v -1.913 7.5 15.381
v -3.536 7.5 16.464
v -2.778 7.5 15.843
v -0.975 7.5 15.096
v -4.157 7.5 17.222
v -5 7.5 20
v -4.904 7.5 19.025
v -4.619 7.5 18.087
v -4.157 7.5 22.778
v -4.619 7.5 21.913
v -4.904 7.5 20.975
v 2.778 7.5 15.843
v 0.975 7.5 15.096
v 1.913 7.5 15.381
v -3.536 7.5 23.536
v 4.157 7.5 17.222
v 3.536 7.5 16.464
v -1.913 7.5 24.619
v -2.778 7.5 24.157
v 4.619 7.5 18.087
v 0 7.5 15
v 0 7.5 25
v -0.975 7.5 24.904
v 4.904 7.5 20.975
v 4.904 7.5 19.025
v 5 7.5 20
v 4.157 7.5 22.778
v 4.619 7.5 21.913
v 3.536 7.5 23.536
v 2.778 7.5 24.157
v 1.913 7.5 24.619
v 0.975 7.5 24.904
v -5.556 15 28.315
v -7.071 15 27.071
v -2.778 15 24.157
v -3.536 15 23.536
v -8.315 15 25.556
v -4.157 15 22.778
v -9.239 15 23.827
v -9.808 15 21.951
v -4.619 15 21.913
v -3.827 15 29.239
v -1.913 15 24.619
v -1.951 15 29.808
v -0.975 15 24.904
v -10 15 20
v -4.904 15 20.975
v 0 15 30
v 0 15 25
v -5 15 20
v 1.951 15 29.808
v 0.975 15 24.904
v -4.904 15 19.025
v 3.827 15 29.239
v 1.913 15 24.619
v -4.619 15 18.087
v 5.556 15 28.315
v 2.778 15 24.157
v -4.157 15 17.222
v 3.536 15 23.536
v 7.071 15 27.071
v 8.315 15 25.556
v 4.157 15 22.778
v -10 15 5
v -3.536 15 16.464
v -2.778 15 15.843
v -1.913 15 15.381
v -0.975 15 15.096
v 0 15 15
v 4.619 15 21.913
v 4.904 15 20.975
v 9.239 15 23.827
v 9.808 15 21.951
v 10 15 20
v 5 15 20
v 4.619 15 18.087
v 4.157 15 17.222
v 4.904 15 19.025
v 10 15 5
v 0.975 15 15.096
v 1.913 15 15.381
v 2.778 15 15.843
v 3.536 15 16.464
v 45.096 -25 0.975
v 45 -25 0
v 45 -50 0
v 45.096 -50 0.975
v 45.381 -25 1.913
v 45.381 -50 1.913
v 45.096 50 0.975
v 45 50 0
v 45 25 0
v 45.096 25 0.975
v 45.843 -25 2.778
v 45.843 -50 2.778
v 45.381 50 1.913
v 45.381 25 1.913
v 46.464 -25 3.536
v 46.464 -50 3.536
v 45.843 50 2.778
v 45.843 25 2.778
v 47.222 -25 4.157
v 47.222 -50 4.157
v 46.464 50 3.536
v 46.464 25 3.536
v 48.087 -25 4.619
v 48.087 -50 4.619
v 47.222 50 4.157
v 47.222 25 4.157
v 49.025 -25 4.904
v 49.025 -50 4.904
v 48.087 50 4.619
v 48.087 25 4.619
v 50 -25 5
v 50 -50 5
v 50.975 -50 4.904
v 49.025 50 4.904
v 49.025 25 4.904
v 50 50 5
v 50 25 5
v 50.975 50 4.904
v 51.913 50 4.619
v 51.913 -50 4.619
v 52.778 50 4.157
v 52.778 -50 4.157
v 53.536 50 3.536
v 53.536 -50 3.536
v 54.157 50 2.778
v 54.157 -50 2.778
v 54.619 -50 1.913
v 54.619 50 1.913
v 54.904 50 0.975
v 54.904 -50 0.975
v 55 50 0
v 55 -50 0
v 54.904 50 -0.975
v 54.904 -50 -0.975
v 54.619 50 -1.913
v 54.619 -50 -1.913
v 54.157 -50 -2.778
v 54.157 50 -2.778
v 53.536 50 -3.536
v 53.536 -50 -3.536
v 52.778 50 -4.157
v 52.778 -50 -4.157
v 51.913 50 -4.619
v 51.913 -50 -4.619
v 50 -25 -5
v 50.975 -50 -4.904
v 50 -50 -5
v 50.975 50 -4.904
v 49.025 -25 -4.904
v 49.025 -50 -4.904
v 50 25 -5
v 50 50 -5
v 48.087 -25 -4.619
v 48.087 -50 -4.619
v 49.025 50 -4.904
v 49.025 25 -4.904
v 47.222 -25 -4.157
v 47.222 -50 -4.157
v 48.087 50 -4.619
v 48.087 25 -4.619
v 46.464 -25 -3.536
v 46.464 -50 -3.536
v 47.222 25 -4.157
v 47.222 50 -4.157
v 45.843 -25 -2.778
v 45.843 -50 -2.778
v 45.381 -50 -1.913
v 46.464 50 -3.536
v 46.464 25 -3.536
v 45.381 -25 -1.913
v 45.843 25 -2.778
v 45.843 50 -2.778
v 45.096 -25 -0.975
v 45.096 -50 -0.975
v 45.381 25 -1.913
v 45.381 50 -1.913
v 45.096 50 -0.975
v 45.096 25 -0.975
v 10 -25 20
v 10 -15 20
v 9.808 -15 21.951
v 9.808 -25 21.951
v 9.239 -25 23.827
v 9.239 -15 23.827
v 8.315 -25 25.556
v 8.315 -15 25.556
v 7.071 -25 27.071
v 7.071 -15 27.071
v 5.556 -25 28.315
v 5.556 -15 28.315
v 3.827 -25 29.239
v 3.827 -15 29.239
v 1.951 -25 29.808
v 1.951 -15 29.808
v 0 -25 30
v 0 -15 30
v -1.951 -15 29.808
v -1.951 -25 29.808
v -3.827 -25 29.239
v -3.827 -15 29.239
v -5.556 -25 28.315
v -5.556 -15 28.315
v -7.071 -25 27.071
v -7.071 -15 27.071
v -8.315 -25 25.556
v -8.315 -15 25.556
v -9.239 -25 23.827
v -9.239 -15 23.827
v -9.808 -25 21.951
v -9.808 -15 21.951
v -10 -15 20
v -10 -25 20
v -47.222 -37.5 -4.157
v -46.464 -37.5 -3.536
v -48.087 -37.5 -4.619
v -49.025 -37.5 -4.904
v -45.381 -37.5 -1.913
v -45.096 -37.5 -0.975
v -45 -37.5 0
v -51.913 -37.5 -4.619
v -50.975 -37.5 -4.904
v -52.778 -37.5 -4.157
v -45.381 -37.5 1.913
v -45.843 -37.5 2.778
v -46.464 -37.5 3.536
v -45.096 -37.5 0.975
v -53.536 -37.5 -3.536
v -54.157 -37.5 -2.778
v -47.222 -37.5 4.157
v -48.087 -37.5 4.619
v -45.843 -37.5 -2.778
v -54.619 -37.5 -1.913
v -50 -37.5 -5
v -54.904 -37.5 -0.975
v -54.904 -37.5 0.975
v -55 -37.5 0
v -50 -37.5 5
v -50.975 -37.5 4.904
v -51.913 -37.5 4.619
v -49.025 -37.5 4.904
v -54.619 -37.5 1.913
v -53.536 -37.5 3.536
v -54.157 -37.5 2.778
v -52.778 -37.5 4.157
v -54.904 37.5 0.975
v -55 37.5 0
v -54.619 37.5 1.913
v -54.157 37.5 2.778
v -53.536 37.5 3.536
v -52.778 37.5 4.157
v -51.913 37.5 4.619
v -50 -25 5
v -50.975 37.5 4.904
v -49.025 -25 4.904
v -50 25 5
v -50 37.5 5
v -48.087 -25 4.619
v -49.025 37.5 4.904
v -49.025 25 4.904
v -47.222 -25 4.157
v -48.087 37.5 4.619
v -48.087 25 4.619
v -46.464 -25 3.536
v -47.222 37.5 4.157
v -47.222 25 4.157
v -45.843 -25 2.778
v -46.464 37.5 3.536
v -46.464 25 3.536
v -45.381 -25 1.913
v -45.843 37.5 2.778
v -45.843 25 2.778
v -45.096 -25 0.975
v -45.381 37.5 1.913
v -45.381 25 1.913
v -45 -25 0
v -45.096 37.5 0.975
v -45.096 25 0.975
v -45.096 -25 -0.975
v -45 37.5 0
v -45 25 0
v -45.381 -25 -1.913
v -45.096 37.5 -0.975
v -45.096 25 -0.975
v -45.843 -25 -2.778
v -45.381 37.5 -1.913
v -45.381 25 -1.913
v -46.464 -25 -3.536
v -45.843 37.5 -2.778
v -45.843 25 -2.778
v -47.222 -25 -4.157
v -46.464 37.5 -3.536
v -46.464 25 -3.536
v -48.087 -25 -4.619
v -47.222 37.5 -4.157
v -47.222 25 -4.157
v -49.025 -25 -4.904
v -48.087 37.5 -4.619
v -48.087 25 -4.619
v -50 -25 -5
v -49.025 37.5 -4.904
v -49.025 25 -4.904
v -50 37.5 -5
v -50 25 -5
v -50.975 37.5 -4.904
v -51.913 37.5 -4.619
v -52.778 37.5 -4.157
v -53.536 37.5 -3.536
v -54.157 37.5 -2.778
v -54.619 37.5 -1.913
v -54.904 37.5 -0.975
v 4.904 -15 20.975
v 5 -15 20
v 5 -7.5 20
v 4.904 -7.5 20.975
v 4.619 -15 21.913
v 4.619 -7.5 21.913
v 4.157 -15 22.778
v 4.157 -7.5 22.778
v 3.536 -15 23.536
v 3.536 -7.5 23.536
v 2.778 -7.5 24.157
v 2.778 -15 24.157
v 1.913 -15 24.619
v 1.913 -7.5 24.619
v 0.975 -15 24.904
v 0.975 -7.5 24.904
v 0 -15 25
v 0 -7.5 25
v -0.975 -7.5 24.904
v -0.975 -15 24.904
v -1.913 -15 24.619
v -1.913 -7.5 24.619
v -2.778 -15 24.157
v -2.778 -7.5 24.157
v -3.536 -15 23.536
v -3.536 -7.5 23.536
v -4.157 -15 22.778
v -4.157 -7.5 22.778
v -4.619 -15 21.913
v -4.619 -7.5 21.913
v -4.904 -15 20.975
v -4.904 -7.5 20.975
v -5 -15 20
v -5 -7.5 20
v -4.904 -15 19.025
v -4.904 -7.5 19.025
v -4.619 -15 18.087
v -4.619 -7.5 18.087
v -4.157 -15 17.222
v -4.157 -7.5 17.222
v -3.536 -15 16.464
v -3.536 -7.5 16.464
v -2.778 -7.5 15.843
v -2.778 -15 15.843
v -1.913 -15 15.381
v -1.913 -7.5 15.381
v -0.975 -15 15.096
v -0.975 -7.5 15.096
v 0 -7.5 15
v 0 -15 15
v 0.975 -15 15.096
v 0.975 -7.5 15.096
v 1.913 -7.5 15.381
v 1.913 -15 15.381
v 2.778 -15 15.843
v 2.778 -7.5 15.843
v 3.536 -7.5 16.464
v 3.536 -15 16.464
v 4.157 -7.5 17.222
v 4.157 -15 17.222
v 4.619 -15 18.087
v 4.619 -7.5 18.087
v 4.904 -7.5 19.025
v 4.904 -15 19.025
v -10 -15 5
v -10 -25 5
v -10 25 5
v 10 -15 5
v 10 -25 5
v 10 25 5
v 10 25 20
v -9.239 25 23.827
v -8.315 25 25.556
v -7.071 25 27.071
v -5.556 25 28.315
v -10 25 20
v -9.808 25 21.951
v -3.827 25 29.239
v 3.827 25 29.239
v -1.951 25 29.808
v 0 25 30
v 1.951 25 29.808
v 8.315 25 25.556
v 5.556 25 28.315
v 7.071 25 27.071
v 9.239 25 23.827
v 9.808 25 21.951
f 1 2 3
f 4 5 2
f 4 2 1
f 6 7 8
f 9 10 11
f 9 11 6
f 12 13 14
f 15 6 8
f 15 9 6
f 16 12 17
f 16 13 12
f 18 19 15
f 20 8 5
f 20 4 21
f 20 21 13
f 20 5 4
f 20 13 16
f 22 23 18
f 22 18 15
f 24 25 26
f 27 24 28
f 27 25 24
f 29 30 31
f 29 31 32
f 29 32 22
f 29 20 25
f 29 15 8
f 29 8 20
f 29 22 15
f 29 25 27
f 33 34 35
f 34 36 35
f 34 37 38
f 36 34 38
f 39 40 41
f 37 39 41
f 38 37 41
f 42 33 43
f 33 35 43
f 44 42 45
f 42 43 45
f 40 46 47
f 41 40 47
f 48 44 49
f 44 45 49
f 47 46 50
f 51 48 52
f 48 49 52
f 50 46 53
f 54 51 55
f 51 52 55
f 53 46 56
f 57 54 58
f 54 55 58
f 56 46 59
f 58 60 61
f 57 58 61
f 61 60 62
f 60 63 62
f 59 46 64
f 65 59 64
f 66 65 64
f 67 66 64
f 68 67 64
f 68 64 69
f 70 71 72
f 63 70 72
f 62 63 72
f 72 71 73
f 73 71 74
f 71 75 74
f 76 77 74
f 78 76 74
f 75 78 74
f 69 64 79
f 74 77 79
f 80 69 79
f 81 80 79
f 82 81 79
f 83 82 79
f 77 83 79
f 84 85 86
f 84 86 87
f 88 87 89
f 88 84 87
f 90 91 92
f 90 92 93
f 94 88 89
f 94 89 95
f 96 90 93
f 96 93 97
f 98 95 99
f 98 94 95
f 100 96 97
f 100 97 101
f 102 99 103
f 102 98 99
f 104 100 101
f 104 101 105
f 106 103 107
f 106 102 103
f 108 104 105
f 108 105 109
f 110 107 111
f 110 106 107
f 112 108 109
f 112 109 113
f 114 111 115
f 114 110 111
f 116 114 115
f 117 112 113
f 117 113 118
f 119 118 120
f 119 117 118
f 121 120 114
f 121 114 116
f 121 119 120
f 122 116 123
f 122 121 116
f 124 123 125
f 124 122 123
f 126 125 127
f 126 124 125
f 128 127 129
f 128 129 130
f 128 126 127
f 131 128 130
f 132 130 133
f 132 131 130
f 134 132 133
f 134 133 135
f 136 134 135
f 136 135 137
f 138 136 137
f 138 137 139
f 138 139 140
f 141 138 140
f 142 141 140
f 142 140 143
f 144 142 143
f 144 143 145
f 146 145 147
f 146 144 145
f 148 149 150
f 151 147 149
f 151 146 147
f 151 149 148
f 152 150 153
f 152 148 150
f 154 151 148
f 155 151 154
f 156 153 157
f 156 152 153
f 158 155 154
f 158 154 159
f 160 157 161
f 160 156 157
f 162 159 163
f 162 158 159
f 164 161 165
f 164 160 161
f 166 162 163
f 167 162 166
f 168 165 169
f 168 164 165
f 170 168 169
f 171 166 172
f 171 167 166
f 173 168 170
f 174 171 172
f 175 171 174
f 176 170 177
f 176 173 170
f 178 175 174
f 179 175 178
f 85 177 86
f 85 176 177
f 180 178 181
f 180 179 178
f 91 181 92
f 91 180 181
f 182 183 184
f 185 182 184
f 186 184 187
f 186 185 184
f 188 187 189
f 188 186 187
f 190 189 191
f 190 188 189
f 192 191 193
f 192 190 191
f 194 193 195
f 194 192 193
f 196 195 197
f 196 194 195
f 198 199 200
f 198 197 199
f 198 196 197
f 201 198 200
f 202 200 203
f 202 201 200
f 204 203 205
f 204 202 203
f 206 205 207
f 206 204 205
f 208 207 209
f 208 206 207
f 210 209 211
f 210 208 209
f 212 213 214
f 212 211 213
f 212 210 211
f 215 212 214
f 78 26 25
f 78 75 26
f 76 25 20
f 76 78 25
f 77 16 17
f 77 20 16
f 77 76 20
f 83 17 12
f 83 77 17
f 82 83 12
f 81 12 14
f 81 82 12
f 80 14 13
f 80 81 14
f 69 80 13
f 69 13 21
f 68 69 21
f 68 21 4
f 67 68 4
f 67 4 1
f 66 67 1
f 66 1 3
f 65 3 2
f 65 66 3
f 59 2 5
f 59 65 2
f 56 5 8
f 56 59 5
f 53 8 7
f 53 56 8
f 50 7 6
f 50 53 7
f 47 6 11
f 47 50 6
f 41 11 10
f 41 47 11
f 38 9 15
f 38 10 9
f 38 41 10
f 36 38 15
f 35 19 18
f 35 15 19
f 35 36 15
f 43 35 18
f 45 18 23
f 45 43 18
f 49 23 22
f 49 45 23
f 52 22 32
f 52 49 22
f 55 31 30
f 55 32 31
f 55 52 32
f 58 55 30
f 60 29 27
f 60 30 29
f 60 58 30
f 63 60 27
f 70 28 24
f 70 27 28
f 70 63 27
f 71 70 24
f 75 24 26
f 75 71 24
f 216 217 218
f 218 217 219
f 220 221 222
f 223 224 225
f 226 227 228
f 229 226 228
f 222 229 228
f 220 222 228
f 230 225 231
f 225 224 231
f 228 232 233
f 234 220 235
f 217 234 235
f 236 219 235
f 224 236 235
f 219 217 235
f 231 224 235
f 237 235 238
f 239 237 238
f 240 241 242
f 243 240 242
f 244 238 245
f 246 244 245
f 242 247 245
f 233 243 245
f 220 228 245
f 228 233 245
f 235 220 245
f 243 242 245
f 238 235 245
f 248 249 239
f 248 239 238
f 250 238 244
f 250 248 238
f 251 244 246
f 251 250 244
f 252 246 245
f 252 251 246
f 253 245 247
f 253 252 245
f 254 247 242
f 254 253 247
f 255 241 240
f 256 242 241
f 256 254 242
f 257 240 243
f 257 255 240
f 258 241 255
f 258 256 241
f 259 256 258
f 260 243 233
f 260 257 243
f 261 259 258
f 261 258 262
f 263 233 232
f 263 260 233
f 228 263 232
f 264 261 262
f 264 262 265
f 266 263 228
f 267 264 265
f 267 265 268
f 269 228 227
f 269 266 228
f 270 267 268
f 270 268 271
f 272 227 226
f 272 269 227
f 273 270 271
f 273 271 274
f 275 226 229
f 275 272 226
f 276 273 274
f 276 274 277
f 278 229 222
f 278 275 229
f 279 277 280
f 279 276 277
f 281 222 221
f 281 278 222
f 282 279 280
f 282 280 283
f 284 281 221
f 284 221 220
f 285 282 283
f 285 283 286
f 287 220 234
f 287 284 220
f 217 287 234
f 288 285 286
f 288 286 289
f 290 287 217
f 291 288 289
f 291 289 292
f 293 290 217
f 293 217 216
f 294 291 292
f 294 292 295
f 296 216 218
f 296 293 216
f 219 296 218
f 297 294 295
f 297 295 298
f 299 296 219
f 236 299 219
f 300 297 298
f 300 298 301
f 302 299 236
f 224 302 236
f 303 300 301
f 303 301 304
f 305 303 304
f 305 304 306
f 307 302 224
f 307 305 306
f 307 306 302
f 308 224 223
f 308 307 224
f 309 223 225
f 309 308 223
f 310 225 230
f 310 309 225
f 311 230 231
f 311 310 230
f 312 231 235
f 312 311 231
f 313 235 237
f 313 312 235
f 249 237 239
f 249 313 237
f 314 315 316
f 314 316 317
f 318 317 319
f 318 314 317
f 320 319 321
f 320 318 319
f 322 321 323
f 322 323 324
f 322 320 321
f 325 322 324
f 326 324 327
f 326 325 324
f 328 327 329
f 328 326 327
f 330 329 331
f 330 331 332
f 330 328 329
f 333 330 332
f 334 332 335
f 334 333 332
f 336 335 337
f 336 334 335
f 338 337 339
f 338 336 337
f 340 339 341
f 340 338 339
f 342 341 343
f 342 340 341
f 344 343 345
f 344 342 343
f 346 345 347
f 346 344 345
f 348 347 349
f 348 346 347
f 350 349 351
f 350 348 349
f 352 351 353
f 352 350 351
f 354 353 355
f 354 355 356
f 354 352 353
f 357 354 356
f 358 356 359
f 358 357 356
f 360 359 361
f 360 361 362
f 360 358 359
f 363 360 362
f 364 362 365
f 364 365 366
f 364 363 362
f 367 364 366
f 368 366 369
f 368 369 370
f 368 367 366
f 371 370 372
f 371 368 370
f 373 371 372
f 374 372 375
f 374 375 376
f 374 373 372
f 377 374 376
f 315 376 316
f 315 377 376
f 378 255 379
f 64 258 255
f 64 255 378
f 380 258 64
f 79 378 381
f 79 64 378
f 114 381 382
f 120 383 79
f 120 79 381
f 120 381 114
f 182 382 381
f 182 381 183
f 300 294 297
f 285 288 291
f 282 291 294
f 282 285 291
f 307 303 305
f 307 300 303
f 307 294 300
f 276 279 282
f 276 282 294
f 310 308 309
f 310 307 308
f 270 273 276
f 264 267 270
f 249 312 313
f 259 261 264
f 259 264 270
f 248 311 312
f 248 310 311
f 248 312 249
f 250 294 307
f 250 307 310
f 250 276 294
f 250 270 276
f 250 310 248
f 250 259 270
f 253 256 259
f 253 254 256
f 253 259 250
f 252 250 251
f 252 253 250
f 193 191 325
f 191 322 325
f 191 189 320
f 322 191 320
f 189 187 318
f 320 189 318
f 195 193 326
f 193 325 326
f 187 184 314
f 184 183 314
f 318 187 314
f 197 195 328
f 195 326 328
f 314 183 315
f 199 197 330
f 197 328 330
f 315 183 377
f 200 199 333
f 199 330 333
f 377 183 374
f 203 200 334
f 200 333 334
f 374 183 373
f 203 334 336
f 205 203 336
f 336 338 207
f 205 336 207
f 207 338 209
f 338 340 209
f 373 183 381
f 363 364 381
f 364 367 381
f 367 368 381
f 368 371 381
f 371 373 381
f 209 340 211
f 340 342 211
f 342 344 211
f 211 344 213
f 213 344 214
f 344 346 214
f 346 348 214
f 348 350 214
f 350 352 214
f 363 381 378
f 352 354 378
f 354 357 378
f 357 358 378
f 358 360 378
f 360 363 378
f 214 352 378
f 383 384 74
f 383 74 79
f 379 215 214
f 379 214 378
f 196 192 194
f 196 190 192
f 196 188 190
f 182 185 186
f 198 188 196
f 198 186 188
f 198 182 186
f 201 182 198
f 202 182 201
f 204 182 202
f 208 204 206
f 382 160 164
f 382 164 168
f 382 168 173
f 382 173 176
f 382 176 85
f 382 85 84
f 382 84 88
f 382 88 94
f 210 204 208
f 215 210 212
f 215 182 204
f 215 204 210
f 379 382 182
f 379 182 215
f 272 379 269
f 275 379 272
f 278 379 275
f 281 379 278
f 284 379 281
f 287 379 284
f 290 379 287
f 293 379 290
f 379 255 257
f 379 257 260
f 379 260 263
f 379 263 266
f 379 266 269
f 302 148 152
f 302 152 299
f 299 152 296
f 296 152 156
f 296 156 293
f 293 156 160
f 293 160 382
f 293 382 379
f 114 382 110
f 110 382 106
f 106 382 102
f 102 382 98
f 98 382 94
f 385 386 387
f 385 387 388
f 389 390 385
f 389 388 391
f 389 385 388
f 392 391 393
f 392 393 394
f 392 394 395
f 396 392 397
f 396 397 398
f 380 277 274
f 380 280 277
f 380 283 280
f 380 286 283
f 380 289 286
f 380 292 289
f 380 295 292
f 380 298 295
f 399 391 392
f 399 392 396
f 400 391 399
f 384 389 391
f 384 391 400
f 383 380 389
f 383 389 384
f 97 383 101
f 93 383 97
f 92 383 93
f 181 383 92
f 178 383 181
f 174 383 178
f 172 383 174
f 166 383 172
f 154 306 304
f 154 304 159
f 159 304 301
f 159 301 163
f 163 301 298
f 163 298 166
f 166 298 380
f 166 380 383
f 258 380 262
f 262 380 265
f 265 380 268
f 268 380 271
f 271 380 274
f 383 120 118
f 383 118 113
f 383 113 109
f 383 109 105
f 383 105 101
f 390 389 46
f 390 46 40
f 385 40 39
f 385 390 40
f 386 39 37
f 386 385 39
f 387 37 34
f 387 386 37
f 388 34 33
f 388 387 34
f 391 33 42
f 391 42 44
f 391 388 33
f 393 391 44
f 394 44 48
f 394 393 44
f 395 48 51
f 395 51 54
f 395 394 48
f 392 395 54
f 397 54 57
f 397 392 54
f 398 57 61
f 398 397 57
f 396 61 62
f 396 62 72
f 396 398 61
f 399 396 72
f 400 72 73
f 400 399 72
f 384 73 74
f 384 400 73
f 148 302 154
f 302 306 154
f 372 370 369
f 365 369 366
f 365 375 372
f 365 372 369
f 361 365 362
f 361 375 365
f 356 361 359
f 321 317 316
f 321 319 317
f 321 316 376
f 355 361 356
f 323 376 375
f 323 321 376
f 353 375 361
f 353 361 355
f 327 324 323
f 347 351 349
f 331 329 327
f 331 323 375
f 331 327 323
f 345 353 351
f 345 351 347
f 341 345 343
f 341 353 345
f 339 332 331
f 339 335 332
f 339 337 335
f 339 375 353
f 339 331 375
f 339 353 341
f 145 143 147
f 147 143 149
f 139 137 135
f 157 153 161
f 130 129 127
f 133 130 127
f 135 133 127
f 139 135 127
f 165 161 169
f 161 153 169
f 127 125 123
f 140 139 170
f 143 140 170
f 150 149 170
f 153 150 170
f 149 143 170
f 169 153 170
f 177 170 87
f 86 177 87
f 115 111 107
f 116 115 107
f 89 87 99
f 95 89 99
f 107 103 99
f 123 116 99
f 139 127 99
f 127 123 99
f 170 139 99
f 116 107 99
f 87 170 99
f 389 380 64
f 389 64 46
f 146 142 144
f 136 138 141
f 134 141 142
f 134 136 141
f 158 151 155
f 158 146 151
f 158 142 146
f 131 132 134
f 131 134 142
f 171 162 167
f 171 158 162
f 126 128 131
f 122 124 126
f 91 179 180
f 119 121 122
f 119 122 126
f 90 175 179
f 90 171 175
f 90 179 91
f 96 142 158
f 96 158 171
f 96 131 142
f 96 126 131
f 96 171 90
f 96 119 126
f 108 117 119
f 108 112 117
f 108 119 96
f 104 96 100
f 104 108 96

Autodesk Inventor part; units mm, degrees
ref_plane "YZ Plane" through (0, 0, 0) normal (1, 0, 0) x (0, 1, 0)
ref_plane "XZ Plane" through (0, 0, 0) normal (0, 1, 0) x (-1, 0, 0)
ref_plane "XY Plane" through (0, 0, 0) normal (0, 0, 1) x (1, 0, 0)
sketch "Sketch1" plane through (0, 0, 0) normal (0, 0, 1) x (1, 0, 0)
  line L0 (-50, 25) -> (50, 25)
  line L1 (50, 25) -> (50, -25)
  line L2 (50, -25) -> (-50, -25)
  line L3 (-50, -25) -> (-50, 25)
  point P0 (0, 0)
  dimension "d0" = 100
  dimension "d1" = 50
  dimension "d2" = 25
  dimension "d3" = 50
extrude "Extrusion1" add sketch "Sketch1" along normal mid plane 10
sketch "Sketch3" plane through (0, 0, 0) normal (0, 1, 0) x (-1, 0, 0)
  line L0 (50, -5) -> (50, 5) projected
  circle A0 centre (50, 0) radius 5
  line L1 (-50, -5) -> (-50, 5) projected
  point P0 (0, 0)
extrude "Extrusion2" add sketch "Sketch3" along normal mid plane 75
sketch "Sketch4" plane through (0, 0, 0) normal (0, 1, 0) x (-1, 0, 0)
  line L0 (-50, -5) -> (-50, 5) projected
  circle A0 centre (-50, 0) radius 5
  point P0 (0, 0)
extrude "Extrusion3" add sketch "Sketch4" along normal mid plane 100
sketch "Sketch8" plane through (-50, 25, 0) normal (0, 1, 0) x (1, 0, 0)
  line L0 (60, 0) -> (40, 0)
  line L1 (40, 0) -> (40, -20)
  line L2 (40, -20) -> (60, -20)
  line L3 (60, -20) -> (60, 0)
  arc A0 (40, -20) -> (60, -20) centre (50, -20) ccw
  point P0 (50, 0)
  dimension "d16" = 20
  dimension "d17" = 20
  dimension "d18" = 10
extrude "Extrusion6" add sketch "Sketch8" against normal blind 10
mirror "Mirror1" about plane through (0, 0, 0) normal (0, 1, 0) of "Extrusion6"
sketch "Sketch9" plane through (-50, 15, 0) normal (0, -1, 0) x (1, 0, 0)
  arc A0 (60, 20) -> (40, 20) centre (50, 20) ccw projected
  circle A1 centre (50, 20) radius 5
  point P0 (50, 0)
  dimension "d21" = 10
extrude "Extrusion7" add sketch "Sketch9" along normal blind 7.5
mirror "Mirror2" about plane through (0, 0, 0) normal (0, 1, 0) of "Extrusion7"
properties part number "enEffector" material "Stainless Steel"
